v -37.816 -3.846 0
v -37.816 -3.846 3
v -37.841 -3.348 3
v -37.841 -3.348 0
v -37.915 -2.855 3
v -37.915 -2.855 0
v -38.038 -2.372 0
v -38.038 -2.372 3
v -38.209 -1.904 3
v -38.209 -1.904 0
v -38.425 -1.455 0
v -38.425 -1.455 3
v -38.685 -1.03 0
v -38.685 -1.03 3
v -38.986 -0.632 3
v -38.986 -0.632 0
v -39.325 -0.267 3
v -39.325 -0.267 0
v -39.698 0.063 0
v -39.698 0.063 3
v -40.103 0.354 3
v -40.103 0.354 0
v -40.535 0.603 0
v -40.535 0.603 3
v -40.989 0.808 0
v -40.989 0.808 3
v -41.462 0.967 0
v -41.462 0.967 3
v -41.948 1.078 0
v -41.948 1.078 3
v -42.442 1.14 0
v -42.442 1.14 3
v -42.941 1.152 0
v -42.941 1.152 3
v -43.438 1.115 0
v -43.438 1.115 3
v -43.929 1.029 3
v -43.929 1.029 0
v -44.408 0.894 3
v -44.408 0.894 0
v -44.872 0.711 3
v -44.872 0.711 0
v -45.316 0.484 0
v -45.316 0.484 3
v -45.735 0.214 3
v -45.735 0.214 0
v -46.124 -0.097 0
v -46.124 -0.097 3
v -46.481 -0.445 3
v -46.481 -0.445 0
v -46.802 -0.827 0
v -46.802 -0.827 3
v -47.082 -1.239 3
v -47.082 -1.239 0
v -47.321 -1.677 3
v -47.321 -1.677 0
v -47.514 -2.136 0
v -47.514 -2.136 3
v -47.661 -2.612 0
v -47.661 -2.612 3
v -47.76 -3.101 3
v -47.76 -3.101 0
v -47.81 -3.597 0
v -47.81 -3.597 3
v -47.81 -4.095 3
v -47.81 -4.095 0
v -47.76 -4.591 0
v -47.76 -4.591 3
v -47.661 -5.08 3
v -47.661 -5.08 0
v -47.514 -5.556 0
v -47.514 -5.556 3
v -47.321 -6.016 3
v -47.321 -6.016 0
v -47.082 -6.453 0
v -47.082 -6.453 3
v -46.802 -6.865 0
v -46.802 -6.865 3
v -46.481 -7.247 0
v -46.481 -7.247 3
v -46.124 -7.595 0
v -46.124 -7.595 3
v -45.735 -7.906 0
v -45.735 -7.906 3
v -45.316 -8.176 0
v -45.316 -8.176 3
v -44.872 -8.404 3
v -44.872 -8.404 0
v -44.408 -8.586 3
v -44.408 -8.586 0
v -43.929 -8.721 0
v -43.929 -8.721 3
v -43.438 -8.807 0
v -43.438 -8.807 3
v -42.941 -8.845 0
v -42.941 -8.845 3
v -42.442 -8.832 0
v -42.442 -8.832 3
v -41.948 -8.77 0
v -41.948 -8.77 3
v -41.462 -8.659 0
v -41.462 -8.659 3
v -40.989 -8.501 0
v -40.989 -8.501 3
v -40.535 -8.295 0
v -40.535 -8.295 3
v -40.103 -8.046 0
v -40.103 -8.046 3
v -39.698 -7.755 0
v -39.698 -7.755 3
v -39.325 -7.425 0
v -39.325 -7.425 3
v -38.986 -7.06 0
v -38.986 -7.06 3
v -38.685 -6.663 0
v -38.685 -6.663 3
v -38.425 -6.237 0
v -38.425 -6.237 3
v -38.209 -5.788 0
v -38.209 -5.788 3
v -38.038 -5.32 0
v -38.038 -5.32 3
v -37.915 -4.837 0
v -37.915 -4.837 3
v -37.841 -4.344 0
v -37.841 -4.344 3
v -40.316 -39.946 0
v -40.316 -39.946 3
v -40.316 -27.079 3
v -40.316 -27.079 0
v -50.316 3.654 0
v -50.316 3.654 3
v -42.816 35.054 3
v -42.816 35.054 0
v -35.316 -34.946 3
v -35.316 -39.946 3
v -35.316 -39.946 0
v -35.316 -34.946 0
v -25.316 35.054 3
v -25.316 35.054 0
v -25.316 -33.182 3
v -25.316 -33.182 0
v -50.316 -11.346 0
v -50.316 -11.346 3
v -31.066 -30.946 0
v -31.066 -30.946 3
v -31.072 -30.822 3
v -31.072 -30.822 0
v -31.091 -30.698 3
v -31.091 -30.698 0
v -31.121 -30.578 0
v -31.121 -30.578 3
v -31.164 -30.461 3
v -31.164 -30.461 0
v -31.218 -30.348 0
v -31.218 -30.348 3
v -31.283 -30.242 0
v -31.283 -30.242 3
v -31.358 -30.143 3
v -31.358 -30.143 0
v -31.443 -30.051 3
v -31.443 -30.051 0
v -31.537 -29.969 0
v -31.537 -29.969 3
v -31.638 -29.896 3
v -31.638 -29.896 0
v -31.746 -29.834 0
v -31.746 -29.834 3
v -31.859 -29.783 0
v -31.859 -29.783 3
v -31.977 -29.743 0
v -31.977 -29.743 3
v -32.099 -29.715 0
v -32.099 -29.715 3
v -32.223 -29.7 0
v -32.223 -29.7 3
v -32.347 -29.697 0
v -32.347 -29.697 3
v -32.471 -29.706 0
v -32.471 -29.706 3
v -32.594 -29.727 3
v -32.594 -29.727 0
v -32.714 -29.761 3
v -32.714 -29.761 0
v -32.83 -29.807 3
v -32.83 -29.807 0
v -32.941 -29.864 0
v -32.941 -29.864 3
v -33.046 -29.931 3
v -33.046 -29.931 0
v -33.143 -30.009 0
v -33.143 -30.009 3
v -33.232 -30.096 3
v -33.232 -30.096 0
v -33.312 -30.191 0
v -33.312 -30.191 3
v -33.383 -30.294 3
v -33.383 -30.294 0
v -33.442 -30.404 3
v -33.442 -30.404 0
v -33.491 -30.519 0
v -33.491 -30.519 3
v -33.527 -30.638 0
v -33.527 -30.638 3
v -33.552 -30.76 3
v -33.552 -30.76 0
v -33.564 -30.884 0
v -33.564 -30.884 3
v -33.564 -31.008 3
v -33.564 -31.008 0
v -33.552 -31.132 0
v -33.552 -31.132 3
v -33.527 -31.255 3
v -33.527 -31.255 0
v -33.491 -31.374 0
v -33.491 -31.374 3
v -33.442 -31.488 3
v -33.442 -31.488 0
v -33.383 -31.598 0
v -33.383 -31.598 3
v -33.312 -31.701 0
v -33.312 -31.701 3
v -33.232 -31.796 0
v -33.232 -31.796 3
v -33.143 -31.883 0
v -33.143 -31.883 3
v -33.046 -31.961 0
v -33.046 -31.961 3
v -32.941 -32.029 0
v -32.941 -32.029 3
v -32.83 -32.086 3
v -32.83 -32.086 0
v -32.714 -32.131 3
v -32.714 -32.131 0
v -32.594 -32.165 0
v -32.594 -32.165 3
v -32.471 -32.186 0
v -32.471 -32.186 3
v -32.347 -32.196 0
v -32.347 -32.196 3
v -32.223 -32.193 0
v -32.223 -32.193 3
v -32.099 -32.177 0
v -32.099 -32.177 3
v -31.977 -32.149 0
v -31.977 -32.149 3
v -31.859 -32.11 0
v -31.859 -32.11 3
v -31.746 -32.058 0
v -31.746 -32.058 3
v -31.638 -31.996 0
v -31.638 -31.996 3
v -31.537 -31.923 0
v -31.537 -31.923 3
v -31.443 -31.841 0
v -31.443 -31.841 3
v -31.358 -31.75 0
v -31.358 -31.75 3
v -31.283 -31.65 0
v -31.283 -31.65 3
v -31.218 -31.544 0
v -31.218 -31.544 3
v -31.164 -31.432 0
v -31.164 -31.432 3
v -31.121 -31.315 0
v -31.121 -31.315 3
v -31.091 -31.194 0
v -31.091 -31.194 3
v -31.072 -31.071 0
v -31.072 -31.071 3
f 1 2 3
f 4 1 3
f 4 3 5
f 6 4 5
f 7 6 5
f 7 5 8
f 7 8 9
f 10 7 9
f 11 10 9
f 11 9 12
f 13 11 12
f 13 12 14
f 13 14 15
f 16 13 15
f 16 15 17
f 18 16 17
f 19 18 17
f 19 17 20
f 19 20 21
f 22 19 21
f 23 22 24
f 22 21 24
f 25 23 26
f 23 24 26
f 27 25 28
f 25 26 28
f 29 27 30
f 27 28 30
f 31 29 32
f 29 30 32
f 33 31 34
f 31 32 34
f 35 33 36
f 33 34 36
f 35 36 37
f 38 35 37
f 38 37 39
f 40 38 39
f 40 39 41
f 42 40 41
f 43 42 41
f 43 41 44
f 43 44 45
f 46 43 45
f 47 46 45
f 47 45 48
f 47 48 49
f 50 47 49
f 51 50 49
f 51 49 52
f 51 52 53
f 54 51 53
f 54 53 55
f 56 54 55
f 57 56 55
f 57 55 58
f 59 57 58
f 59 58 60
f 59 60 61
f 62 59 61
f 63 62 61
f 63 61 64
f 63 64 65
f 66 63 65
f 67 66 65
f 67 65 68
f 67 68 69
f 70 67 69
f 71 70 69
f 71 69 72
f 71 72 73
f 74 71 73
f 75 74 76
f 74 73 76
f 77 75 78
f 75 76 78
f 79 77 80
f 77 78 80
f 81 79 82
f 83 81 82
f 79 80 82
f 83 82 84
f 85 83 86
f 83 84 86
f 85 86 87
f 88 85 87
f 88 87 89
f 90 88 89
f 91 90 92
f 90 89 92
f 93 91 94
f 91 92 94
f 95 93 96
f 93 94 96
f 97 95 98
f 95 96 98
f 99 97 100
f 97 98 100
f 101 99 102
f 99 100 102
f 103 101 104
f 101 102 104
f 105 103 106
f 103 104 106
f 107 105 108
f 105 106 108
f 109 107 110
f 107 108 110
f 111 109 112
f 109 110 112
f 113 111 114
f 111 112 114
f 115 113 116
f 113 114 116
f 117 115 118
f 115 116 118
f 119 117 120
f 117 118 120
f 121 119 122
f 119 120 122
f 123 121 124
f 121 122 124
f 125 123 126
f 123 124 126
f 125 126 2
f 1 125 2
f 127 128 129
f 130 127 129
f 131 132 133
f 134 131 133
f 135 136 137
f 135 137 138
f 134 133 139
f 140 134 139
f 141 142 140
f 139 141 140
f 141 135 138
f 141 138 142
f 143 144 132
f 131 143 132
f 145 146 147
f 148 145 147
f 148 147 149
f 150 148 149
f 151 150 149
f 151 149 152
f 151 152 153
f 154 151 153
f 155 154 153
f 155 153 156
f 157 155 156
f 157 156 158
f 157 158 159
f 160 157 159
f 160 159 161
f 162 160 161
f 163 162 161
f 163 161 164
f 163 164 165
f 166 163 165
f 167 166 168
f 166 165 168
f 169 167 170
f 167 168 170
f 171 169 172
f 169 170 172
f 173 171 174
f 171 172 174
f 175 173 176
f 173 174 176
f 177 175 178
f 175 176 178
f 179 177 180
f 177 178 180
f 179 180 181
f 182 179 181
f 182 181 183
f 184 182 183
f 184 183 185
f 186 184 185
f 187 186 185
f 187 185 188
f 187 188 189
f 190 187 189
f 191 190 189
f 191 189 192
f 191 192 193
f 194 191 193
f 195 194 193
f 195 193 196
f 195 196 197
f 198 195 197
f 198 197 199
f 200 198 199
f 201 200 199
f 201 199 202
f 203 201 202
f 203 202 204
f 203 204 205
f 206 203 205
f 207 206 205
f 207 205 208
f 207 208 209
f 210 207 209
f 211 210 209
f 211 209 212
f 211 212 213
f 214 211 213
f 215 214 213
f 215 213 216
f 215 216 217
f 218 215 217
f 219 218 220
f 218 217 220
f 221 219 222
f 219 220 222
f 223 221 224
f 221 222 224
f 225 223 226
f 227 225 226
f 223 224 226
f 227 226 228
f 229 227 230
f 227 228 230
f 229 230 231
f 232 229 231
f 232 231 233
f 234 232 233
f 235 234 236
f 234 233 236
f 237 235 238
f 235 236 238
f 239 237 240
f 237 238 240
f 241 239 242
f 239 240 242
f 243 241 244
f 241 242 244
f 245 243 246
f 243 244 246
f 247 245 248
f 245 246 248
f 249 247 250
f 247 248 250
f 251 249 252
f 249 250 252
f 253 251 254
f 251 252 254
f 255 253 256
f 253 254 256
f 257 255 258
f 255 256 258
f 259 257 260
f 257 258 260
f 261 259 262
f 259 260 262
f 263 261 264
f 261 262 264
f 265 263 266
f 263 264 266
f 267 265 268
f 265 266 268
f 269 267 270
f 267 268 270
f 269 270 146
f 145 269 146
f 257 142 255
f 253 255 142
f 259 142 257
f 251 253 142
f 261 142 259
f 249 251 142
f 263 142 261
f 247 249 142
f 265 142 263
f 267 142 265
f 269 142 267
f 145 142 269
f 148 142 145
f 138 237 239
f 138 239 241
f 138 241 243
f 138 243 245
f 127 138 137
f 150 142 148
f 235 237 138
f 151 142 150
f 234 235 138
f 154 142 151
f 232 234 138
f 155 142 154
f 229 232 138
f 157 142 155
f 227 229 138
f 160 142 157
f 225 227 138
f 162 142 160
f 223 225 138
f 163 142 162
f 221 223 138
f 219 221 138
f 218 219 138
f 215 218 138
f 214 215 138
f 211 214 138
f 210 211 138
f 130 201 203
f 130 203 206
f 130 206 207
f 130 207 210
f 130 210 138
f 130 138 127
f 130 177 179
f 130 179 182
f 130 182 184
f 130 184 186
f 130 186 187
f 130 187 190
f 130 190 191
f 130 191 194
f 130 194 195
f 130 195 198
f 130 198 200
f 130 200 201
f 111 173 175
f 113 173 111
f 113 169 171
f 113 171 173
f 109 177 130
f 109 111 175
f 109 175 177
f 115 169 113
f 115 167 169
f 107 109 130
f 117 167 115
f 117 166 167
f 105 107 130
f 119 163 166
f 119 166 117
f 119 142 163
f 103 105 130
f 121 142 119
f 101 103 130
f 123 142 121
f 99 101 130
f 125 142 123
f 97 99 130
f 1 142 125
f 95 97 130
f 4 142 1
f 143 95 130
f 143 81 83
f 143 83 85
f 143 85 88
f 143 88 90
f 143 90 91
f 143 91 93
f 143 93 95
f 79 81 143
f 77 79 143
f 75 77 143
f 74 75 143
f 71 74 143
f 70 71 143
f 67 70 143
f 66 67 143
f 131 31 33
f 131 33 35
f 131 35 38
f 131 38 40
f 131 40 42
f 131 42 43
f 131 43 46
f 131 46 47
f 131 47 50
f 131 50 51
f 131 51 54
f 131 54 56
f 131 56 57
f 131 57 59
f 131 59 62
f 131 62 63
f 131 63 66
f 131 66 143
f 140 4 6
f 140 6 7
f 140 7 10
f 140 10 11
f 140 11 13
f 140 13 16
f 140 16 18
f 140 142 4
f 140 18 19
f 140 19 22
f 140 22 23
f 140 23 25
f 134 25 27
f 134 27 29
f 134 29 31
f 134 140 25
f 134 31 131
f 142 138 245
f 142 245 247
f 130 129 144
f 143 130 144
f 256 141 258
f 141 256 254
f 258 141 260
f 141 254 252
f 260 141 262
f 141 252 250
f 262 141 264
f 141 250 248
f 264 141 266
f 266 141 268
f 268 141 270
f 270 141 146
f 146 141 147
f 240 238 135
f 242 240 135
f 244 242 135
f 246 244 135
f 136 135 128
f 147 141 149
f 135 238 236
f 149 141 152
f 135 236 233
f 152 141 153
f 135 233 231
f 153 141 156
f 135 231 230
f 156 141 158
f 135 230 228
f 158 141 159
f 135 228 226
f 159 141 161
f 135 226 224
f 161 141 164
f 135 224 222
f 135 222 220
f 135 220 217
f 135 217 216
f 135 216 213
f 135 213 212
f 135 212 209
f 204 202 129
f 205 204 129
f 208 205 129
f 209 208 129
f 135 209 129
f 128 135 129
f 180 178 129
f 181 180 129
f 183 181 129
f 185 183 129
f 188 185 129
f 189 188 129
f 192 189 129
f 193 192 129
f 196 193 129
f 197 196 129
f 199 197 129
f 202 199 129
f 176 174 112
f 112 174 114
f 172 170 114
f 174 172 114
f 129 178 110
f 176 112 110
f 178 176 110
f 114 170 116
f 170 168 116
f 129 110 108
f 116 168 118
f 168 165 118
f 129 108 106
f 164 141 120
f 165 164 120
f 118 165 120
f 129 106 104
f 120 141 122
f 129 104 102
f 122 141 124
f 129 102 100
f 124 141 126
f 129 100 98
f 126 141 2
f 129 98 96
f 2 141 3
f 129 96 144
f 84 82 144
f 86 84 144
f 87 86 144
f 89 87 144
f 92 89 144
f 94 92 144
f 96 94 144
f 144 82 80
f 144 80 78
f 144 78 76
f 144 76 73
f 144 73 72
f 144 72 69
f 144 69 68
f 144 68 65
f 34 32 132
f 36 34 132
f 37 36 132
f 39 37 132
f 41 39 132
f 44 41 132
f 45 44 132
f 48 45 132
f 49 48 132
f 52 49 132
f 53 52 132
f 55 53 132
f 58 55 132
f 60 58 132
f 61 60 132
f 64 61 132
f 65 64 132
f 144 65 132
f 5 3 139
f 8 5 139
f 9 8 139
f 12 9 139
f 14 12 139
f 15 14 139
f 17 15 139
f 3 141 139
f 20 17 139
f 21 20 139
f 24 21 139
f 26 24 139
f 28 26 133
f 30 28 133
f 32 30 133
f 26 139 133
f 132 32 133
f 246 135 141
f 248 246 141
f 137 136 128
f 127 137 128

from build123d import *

# Parameters (mm, degrees)
SKETCH1_W           = 10
SKETCH1_H           = 70
BOSS_EXTRUDE1_DEPTH = 3
BOSS_EXTRUDE2_DEPTH = 3
SKETCH3_R           = 5
SKETCH3_R_2         = 1.25
CUT_EXTRUDE1_DEPTH  = 4


with BuildPart() as part:
    # Sketch1 → Boss-Extrude1 (new body)
    with BuildSketch(Plane.XY):
        with Locations((-30.31593178, 0.053868552)):
            Rectangle(SKETCH1_W, SKETCH1_H)
    extrude(amount=BOSS_EXTRUDE1_DEPTH)

    # Sketch2 → Boss-Extrude2 (add)
    with BuildSketch(Plane.XY.offset(3)):
        Polygon((-40.31593178, -39.946131448), (-40.31593178, -27.079464781), (-50.31593178, -11.346131448), (-50.31593178, 3.653868552), (-42.81593178, 35.053868552), (-35.31593178, 35.053868552), (-35.31593178, -34.946131448), (-35.31593178, -39.946131448), align=None)
    extrude(amount=-BOSS_EXTRUDE2_DEPTH)

    # Sketch3 → Cut-Extrude1 (cut, through all)
    with BuildSketch(Plane.XY.offset(3)):
        with Locations((-42.81593178, -3.846131448)):
            Circle(SKETCH3_R)
        with Locations((-32.31593178, -30.946131448)):
            Circle(SKETCH3_R_2)
        Polygon((-35.31593178, -34.946131448), (-25.31593178, -33.182379001), (-25.31593178, -34.946131448), align=None)
    extrude(amount=-CUT_EXTRUDE1_DEPTH, mode=Mode.SUBTRACT)


solid = part.part
